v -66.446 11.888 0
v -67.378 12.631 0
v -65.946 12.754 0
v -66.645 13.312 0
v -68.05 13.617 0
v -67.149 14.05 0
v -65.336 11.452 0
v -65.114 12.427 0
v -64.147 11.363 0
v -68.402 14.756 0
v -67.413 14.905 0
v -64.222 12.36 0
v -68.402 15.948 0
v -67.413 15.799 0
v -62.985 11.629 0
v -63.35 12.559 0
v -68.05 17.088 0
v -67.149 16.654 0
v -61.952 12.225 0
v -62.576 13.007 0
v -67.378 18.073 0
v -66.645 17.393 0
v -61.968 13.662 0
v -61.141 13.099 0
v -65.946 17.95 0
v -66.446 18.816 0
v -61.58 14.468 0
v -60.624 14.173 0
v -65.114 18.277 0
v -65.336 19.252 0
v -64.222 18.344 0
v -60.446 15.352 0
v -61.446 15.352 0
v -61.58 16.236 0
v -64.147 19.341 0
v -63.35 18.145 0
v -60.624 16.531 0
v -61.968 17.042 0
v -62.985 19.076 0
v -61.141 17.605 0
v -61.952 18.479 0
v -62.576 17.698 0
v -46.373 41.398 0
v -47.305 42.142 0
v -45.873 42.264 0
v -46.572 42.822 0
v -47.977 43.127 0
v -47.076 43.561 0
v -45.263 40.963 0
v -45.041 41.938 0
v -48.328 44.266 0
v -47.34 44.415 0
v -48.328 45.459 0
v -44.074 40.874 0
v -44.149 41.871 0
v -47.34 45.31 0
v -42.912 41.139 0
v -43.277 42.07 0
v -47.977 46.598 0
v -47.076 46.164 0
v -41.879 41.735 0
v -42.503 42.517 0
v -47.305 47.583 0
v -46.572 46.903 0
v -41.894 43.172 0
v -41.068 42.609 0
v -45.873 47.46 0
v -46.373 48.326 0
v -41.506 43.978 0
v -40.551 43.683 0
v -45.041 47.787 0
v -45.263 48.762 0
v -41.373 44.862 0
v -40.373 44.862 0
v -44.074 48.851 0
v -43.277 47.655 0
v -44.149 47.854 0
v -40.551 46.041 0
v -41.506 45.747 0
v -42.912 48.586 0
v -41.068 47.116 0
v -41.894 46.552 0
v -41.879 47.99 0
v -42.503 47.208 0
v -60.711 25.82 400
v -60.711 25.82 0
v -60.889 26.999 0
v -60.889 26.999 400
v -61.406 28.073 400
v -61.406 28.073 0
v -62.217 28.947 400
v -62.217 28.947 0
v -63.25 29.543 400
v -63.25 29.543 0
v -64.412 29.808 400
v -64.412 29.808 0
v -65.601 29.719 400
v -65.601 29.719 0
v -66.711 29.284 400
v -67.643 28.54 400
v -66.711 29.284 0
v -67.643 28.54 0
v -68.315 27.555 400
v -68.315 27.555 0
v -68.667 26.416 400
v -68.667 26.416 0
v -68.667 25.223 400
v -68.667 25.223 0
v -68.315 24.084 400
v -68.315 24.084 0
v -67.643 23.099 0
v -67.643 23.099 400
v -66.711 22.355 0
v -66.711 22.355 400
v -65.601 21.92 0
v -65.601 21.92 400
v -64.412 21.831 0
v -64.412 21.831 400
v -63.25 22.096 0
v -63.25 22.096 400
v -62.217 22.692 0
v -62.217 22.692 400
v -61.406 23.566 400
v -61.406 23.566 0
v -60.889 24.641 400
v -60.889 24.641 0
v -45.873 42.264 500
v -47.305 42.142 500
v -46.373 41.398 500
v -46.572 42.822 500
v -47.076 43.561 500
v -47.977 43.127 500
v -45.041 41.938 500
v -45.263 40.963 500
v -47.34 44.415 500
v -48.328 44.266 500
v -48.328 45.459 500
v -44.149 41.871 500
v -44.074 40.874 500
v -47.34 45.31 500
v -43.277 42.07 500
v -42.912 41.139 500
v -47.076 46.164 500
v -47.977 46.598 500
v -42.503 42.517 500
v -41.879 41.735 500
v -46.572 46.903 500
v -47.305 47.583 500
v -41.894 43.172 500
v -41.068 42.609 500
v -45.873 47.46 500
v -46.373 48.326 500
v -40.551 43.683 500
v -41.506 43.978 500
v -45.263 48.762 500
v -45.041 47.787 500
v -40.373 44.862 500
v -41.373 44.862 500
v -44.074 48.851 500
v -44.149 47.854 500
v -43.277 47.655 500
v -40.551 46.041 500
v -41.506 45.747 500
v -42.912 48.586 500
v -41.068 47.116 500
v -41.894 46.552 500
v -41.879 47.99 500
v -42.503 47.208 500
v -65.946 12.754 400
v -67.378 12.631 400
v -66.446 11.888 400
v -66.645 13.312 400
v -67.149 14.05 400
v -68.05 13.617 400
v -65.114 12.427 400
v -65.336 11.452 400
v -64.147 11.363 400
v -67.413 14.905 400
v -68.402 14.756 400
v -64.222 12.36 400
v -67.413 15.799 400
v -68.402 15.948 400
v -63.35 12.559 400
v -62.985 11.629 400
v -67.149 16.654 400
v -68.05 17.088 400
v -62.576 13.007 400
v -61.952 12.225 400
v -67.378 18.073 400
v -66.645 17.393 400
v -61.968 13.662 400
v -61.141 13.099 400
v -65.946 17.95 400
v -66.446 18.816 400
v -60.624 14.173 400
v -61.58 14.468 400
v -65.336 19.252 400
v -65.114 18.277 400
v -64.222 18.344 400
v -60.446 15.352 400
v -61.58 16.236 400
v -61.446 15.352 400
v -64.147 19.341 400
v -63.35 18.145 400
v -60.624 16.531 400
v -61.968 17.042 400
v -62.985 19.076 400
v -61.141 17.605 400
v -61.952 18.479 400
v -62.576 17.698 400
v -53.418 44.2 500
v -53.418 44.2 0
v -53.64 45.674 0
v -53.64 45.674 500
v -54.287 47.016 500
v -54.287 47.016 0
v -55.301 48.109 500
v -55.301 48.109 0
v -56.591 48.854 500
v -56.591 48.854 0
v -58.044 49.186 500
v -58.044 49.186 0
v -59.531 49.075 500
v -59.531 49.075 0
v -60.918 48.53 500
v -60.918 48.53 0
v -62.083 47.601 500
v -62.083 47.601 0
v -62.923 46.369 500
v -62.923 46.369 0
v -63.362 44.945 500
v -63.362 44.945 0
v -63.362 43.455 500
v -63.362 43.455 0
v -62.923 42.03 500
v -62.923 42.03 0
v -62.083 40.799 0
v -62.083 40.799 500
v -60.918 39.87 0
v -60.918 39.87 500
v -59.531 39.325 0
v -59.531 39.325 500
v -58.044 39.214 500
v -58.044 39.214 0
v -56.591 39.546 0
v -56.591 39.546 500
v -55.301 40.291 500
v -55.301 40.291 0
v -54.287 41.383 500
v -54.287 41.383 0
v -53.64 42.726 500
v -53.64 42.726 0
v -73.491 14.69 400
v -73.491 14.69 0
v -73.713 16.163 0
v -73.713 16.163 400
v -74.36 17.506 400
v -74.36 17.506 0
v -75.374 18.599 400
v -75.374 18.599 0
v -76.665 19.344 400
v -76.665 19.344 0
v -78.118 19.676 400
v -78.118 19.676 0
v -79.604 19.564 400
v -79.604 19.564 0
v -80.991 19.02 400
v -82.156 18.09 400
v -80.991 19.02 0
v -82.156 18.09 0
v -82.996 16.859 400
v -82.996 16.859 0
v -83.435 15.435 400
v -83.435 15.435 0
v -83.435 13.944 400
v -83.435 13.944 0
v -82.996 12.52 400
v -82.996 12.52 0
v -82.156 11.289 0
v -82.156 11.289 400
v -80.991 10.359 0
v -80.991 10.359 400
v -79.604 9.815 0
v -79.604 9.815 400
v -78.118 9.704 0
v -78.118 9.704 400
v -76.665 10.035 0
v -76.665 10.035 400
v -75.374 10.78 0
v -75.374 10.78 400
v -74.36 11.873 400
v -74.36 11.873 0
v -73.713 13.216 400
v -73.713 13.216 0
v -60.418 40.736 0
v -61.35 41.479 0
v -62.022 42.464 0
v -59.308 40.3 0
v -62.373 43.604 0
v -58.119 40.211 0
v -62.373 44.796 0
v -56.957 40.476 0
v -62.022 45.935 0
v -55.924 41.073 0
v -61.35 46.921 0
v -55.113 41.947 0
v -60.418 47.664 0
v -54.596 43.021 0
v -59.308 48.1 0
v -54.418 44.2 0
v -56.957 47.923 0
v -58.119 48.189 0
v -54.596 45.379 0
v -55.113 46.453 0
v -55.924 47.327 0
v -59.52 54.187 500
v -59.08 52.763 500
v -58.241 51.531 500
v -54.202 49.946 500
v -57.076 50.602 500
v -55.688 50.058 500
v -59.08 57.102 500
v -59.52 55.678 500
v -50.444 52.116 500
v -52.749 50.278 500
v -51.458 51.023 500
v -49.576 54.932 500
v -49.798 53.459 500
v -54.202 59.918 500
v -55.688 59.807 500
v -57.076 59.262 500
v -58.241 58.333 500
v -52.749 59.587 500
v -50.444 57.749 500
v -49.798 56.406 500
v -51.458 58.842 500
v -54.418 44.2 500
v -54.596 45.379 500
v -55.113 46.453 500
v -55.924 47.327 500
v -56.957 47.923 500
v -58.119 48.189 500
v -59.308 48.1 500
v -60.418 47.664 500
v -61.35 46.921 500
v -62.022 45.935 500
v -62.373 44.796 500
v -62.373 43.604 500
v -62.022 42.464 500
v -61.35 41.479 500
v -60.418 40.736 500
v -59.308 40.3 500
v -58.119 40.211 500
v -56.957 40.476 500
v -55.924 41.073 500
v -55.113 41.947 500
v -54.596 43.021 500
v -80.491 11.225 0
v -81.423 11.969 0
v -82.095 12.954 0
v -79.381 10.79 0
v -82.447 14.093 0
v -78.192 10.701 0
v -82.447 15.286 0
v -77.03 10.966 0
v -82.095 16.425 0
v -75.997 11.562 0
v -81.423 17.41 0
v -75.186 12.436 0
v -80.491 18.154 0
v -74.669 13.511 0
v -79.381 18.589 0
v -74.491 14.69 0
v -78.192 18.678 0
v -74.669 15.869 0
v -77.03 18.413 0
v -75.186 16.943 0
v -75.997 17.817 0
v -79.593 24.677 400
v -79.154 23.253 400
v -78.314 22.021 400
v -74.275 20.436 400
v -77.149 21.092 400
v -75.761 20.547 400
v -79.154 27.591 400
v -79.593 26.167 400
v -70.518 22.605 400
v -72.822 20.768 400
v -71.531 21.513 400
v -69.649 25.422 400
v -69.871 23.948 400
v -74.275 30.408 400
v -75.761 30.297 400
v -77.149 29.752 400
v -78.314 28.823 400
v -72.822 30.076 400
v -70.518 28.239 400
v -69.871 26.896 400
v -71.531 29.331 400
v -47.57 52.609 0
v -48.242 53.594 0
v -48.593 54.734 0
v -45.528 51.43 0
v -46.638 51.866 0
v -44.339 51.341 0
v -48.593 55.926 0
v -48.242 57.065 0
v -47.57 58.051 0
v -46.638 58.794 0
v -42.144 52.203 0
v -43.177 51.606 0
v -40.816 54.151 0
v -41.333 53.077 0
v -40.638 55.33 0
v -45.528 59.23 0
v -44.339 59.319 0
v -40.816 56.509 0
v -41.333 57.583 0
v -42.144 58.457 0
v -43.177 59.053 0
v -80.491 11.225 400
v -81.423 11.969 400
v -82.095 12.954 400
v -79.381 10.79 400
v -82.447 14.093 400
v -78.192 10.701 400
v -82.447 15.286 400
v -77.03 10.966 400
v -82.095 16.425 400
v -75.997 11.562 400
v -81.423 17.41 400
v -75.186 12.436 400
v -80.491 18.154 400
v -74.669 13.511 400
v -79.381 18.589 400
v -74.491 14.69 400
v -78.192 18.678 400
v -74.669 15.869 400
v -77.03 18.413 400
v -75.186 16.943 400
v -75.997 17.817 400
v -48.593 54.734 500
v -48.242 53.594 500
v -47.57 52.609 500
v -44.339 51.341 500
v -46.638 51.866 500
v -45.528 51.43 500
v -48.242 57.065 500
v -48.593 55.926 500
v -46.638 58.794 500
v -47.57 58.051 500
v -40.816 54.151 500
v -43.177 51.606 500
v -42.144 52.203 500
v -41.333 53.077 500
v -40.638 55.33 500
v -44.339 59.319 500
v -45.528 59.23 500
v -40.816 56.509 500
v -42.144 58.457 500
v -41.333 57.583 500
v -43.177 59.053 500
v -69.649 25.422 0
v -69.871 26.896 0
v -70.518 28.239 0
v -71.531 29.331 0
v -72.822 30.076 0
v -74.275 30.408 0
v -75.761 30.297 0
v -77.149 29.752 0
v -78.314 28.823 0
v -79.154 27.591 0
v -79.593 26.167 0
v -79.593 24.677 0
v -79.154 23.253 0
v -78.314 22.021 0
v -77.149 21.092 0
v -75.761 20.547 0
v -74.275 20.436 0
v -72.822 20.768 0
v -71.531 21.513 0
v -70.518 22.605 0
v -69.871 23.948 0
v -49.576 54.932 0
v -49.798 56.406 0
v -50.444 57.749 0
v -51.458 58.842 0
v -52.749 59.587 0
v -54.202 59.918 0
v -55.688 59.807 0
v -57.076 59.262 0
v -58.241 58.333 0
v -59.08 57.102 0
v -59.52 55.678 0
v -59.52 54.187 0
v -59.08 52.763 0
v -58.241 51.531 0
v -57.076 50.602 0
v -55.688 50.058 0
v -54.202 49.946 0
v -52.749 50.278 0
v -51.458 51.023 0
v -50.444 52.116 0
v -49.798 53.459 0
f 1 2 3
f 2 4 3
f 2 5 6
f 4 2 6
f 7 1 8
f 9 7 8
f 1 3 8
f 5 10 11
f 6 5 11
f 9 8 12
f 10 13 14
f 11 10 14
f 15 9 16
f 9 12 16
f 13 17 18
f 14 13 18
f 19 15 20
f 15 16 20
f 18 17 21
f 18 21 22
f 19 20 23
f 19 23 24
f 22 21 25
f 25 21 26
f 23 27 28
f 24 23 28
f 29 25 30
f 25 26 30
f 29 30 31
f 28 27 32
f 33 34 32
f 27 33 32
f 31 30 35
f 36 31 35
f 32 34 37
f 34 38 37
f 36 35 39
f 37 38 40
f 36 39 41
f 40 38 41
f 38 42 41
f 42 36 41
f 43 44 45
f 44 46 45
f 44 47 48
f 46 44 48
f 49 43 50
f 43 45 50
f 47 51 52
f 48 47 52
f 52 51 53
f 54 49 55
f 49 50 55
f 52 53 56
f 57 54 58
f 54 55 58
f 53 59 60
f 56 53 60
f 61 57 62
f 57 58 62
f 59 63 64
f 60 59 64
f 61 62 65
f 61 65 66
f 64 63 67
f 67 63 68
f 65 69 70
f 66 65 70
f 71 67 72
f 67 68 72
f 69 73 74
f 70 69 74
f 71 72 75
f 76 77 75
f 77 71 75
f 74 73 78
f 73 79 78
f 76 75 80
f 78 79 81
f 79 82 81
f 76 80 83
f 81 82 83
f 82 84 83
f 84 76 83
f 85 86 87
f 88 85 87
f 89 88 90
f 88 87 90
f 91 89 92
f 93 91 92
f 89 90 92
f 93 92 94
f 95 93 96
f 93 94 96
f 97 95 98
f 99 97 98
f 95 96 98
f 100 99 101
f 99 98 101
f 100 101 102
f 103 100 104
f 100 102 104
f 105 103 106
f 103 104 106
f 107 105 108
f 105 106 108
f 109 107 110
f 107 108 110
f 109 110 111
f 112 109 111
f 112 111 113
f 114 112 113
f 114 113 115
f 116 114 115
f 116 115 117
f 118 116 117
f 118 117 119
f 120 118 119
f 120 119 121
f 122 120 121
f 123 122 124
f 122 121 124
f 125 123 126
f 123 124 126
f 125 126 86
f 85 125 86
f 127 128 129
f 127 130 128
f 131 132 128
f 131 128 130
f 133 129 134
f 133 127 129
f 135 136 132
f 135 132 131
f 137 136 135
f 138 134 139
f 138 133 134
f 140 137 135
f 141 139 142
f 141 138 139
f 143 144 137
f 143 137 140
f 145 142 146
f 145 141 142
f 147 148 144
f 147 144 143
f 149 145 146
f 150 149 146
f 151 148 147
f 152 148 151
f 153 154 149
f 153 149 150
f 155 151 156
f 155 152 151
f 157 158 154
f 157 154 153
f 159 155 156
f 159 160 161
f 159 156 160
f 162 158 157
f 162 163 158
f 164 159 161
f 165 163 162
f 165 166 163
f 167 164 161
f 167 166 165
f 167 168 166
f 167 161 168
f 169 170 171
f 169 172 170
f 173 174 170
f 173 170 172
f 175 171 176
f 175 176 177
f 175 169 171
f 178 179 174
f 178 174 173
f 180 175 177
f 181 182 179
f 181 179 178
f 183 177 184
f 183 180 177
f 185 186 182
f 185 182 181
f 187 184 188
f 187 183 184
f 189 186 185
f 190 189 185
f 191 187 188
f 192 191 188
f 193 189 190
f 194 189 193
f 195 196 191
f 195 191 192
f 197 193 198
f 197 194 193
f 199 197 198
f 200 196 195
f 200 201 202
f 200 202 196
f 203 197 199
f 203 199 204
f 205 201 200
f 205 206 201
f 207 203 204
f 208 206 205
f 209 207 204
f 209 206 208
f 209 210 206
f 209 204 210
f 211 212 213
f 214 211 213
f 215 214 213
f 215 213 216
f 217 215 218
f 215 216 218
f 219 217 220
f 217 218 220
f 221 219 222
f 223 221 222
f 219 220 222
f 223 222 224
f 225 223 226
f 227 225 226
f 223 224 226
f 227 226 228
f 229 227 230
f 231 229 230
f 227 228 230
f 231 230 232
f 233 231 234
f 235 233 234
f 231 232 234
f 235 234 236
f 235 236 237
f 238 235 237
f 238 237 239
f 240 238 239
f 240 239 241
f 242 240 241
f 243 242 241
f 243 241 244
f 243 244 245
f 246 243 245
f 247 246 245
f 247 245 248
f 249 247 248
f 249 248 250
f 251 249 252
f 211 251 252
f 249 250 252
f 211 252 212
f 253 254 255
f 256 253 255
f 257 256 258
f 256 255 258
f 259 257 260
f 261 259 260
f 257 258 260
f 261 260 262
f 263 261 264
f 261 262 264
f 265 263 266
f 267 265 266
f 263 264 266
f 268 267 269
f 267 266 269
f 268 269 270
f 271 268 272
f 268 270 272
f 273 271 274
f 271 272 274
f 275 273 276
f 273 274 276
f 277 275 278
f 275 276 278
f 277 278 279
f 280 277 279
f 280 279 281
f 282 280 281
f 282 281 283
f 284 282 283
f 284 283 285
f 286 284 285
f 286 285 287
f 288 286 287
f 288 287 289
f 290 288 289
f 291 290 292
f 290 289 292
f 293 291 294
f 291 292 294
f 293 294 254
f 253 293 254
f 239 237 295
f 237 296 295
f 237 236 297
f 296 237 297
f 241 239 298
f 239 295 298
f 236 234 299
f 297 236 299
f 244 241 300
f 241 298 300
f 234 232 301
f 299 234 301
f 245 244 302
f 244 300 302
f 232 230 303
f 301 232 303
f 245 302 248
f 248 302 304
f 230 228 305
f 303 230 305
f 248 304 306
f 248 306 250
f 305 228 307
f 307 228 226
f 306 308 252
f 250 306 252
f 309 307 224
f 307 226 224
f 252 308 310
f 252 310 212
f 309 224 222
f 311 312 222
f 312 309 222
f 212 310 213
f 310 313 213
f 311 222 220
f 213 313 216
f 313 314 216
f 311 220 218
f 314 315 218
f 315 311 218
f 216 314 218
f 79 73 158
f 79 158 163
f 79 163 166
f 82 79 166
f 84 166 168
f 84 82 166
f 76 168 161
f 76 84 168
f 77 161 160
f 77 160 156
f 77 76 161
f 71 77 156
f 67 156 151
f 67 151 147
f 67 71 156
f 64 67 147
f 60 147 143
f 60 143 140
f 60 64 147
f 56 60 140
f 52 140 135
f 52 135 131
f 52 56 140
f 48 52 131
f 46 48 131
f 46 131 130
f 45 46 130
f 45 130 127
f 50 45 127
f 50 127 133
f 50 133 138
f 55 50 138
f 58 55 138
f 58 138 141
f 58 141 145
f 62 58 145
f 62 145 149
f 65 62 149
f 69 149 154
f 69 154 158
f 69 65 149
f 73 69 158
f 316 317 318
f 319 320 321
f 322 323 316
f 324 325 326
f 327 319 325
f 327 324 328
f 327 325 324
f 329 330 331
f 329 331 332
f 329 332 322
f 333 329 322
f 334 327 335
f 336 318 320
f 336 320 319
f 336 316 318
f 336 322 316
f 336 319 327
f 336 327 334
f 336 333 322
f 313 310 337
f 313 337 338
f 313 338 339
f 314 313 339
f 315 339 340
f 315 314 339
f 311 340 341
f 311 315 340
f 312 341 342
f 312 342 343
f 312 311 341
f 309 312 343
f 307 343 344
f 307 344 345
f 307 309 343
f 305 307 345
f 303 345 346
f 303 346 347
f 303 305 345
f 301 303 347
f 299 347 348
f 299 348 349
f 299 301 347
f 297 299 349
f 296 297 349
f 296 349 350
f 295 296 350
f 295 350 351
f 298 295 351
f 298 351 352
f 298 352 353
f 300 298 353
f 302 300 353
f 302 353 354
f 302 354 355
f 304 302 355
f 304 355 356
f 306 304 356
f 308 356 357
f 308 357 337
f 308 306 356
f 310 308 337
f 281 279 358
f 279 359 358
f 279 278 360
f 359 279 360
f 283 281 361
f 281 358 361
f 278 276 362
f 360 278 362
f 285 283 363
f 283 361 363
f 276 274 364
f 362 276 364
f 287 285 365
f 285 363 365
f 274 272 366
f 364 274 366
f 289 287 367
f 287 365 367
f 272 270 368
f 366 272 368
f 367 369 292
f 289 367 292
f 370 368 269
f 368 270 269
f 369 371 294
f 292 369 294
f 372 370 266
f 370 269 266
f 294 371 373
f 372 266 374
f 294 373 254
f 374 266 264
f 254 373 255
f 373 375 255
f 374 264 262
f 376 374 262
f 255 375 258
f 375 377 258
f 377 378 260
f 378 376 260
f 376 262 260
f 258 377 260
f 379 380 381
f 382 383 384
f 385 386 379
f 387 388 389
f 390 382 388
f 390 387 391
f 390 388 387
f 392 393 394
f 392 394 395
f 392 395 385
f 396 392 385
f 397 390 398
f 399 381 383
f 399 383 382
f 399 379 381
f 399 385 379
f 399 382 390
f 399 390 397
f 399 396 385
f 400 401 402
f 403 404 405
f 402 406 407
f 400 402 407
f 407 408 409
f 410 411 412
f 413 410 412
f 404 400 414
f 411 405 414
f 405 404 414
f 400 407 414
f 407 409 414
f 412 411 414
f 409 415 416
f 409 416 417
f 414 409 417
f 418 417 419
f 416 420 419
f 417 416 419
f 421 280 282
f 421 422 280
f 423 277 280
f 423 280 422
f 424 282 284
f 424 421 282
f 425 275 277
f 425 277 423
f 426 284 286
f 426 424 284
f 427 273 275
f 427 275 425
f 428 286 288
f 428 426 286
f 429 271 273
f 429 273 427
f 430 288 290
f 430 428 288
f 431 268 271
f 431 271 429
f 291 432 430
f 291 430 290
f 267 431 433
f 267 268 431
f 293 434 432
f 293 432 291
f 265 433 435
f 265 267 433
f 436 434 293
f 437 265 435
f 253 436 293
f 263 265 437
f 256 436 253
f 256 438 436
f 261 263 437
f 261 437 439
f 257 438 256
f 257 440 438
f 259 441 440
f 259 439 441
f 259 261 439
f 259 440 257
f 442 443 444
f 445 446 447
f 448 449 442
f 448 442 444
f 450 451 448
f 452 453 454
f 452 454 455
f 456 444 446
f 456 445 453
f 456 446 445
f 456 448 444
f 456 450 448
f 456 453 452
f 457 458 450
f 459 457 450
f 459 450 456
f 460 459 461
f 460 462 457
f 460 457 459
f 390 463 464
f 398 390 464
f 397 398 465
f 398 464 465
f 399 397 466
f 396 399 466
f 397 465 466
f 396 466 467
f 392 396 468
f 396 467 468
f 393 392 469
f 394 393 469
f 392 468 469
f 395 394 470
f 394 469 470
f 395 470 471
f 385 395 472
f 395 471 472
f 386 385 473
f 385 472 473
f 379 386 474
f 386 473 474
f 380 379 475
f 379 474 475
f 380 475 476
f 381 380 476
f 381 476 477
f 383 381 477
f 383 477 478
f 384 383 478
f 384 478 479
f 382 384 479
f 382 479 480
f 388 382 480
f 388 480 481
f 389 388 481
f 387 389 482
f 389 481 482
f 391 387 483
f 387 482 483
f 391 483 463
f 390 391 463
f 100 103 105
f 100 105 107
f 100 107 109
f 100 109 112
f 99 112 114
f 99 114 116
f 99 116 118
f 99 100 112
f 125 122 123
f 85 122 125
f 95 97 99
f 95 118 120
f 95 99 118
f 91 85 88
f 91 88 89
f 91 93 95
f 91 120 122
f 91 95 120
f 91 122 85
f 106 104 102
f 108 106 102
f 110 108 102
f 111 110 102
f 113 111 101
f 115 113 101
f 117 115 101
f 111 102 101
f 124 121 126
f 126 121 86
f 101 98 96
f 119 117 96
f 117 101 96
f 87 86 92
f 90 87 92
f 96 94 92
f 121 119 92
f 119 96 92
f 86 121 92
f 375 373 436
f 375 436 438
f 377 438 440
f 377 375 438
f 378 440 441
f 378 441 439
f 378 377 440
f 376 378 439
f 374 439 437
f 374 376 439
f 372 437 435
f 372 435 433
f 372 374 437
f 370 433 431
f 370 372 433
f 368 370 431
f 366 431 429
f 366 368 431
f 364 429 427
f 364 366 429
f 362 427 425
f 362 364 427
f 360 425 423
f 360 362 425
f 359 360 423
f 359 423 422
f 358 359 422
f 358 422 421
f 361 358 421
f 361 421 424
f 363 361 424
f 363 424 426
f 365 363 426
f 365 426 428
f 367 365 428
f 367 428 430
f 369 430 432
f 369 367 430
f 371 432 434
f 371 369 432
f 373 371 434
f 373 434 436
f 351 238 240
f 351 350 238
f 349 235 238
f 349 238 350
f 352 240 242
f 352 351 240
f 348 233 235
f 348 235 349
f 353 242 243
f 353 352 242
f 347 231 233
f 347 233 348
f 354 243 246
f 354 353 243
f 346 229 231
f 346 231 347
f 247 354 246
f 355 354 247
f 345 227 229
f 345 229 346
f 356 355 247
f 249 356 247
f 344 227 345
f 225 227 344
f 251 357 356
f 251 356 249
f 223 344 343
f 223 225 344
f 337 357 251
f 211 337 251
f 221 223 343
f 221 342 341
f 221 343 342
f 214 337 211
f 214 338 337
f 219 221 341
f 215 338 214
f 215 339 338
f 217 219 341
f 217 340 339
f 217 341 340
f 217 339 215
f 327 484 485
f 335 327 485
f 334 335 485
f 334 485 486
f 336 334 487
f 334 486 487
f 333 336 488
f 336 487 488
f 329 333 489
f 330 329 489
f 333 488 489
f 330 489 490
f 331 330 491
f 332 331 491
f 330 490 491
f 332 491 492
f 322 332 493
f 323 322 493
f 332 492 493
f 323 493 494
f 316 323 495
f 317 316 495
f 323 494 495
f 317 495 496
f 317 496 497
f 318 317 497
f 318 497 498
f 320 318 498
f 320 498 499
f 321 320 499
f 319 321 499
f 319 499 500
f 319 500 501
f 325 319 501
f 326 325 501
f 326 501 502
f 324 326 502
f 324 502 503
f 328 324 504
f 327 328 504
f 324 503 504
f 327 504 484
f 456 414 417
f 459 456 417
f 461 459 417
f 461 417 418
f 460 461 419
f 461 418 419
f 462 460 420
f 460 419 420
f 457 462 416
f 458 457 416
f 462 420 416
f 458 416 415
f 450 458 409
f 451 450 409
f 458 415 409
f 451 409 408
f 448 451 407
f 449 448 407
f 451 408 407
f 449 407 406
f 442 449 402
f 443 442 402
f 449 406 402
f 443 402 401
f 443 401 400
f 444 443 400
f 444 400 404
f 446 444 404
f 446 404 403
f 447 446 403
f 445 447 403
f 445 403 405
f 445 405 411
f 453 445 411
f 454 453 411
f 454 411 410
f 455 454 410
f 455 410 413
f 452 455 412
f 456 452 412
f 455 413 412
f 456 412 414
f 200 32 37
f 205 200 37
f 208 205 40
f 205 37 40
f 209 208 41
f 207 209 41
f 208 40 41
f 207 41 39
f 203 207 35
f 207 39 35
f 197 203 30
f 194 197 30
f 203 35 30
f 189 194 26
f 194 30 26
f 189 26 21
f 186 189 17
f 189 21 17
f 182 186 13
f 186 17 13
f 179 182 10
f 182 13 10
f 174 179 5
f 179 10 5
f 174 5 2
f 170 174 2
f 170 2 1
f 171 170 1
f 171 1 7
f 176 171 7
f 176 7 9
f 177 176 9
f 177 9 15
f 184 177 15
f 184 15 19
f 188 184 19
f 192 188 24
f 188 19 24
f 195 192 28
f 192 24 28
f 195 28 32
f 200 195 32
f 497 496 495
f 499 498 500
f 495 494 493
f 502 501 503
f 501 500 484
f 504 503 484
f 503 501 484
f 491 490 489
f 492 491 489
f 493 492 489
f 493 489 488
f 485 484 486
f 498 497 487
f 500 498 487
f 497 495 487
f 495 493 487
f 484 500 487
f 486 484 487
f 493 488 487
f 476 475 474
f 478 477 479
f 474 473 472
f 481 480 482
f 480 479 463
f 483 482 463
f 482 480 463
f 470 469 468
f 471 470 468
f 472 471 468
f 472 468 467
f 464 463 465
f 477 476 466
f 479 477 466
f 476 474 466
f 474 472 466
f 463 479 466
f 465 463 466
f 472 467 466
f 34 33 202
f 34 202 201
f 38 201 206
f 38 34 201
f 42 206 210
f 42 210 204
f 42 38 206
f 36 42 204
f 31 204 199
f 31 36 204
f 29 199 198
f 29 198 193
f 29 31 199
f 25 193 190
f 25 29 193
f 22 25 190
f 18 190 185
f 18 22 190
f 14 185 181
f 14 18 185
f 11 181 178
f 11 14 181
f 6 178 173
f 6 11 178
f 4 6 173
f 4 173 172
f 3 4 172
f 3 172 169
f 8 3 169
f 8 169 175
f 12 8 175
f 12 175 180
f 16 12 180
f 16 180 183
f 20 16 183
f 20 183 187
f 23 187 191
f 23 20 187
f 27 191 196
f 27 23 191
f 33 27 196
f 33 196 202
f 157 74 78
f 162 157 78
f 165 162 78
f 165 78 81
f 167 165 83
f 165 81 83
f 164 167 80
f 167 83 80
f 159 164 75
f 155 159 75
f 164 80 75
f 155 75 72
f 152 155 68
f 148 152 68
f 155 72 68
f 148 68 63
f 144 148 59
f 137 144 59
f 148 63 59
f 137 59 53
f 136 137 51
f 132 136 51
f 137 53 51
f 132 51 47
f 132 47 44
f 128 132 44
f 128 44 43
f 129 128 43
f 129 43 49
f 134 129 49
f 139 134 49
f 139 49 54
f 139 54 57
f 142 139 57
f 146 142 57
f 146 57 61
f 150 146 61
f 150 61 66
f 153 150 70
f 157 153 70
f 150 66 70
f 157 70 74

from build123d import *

# Parameters (mm, degrees)
F0_R     = 5
F0_R_2   = 4
F0_R_3   = 3
F1_DEPTH = 500
F2_R     = 5
F2_R_2   = 4
F2_R_3   = 3
F3_DEPTH = 400


with BuildPart() as f1:
    # F0 (on Top) → F1 (new body)
    with BuildSketch(Plane.XY):
        with Locations((-54.57551, 54.932353)):
            Circle(F0_R)
        with Locations((-44.638025, 55.329853)):
            Circle(F0_R_2)
        with Locations((-58.418002, 44.199873)):
            Circle(F0_R)
        with Locations((-58.418002, 44.199873)):
            Circle(F0_R_2, mode=Mode.SUBTRACT)
        with Locations((-44.373027, 44.862375)):
            Circle(F0_R_2)
        with Locations((-44.373027, 44.862375)):
            Circle(F0_R_3, mode=Mode.SUBTRACT)
    extrude(amount=F1_DEPTH)


with BuildPart() as f3:
    # F2 (on Top) → F3 (new body)
    with BuildSketch(Plane.XY):
        with Locations((-74.648722, 25.422063)):
            Circle(F2_R)
        with Locations((-64.711238, 25.819563)):
            Circle(F2_R_2)
        with Locations((-78.491215, 14.689583)):
            Circle(F2_R)
        with Locations((-78.491215, 14.689583)):
            Circle(F2_R_2, mode=Mode.SUBTRACT)
        with Locations((-64.44624, 15.352085)):
            Circle(F2_R_2)
        with Locations((-64.44624, 15.352085)):
            Circle(F2_R_3, mode=Mode.SUBTRACT)
    extrude(amount=F3_DEPTH)


solid = Compound([f1.part, f3.part])
